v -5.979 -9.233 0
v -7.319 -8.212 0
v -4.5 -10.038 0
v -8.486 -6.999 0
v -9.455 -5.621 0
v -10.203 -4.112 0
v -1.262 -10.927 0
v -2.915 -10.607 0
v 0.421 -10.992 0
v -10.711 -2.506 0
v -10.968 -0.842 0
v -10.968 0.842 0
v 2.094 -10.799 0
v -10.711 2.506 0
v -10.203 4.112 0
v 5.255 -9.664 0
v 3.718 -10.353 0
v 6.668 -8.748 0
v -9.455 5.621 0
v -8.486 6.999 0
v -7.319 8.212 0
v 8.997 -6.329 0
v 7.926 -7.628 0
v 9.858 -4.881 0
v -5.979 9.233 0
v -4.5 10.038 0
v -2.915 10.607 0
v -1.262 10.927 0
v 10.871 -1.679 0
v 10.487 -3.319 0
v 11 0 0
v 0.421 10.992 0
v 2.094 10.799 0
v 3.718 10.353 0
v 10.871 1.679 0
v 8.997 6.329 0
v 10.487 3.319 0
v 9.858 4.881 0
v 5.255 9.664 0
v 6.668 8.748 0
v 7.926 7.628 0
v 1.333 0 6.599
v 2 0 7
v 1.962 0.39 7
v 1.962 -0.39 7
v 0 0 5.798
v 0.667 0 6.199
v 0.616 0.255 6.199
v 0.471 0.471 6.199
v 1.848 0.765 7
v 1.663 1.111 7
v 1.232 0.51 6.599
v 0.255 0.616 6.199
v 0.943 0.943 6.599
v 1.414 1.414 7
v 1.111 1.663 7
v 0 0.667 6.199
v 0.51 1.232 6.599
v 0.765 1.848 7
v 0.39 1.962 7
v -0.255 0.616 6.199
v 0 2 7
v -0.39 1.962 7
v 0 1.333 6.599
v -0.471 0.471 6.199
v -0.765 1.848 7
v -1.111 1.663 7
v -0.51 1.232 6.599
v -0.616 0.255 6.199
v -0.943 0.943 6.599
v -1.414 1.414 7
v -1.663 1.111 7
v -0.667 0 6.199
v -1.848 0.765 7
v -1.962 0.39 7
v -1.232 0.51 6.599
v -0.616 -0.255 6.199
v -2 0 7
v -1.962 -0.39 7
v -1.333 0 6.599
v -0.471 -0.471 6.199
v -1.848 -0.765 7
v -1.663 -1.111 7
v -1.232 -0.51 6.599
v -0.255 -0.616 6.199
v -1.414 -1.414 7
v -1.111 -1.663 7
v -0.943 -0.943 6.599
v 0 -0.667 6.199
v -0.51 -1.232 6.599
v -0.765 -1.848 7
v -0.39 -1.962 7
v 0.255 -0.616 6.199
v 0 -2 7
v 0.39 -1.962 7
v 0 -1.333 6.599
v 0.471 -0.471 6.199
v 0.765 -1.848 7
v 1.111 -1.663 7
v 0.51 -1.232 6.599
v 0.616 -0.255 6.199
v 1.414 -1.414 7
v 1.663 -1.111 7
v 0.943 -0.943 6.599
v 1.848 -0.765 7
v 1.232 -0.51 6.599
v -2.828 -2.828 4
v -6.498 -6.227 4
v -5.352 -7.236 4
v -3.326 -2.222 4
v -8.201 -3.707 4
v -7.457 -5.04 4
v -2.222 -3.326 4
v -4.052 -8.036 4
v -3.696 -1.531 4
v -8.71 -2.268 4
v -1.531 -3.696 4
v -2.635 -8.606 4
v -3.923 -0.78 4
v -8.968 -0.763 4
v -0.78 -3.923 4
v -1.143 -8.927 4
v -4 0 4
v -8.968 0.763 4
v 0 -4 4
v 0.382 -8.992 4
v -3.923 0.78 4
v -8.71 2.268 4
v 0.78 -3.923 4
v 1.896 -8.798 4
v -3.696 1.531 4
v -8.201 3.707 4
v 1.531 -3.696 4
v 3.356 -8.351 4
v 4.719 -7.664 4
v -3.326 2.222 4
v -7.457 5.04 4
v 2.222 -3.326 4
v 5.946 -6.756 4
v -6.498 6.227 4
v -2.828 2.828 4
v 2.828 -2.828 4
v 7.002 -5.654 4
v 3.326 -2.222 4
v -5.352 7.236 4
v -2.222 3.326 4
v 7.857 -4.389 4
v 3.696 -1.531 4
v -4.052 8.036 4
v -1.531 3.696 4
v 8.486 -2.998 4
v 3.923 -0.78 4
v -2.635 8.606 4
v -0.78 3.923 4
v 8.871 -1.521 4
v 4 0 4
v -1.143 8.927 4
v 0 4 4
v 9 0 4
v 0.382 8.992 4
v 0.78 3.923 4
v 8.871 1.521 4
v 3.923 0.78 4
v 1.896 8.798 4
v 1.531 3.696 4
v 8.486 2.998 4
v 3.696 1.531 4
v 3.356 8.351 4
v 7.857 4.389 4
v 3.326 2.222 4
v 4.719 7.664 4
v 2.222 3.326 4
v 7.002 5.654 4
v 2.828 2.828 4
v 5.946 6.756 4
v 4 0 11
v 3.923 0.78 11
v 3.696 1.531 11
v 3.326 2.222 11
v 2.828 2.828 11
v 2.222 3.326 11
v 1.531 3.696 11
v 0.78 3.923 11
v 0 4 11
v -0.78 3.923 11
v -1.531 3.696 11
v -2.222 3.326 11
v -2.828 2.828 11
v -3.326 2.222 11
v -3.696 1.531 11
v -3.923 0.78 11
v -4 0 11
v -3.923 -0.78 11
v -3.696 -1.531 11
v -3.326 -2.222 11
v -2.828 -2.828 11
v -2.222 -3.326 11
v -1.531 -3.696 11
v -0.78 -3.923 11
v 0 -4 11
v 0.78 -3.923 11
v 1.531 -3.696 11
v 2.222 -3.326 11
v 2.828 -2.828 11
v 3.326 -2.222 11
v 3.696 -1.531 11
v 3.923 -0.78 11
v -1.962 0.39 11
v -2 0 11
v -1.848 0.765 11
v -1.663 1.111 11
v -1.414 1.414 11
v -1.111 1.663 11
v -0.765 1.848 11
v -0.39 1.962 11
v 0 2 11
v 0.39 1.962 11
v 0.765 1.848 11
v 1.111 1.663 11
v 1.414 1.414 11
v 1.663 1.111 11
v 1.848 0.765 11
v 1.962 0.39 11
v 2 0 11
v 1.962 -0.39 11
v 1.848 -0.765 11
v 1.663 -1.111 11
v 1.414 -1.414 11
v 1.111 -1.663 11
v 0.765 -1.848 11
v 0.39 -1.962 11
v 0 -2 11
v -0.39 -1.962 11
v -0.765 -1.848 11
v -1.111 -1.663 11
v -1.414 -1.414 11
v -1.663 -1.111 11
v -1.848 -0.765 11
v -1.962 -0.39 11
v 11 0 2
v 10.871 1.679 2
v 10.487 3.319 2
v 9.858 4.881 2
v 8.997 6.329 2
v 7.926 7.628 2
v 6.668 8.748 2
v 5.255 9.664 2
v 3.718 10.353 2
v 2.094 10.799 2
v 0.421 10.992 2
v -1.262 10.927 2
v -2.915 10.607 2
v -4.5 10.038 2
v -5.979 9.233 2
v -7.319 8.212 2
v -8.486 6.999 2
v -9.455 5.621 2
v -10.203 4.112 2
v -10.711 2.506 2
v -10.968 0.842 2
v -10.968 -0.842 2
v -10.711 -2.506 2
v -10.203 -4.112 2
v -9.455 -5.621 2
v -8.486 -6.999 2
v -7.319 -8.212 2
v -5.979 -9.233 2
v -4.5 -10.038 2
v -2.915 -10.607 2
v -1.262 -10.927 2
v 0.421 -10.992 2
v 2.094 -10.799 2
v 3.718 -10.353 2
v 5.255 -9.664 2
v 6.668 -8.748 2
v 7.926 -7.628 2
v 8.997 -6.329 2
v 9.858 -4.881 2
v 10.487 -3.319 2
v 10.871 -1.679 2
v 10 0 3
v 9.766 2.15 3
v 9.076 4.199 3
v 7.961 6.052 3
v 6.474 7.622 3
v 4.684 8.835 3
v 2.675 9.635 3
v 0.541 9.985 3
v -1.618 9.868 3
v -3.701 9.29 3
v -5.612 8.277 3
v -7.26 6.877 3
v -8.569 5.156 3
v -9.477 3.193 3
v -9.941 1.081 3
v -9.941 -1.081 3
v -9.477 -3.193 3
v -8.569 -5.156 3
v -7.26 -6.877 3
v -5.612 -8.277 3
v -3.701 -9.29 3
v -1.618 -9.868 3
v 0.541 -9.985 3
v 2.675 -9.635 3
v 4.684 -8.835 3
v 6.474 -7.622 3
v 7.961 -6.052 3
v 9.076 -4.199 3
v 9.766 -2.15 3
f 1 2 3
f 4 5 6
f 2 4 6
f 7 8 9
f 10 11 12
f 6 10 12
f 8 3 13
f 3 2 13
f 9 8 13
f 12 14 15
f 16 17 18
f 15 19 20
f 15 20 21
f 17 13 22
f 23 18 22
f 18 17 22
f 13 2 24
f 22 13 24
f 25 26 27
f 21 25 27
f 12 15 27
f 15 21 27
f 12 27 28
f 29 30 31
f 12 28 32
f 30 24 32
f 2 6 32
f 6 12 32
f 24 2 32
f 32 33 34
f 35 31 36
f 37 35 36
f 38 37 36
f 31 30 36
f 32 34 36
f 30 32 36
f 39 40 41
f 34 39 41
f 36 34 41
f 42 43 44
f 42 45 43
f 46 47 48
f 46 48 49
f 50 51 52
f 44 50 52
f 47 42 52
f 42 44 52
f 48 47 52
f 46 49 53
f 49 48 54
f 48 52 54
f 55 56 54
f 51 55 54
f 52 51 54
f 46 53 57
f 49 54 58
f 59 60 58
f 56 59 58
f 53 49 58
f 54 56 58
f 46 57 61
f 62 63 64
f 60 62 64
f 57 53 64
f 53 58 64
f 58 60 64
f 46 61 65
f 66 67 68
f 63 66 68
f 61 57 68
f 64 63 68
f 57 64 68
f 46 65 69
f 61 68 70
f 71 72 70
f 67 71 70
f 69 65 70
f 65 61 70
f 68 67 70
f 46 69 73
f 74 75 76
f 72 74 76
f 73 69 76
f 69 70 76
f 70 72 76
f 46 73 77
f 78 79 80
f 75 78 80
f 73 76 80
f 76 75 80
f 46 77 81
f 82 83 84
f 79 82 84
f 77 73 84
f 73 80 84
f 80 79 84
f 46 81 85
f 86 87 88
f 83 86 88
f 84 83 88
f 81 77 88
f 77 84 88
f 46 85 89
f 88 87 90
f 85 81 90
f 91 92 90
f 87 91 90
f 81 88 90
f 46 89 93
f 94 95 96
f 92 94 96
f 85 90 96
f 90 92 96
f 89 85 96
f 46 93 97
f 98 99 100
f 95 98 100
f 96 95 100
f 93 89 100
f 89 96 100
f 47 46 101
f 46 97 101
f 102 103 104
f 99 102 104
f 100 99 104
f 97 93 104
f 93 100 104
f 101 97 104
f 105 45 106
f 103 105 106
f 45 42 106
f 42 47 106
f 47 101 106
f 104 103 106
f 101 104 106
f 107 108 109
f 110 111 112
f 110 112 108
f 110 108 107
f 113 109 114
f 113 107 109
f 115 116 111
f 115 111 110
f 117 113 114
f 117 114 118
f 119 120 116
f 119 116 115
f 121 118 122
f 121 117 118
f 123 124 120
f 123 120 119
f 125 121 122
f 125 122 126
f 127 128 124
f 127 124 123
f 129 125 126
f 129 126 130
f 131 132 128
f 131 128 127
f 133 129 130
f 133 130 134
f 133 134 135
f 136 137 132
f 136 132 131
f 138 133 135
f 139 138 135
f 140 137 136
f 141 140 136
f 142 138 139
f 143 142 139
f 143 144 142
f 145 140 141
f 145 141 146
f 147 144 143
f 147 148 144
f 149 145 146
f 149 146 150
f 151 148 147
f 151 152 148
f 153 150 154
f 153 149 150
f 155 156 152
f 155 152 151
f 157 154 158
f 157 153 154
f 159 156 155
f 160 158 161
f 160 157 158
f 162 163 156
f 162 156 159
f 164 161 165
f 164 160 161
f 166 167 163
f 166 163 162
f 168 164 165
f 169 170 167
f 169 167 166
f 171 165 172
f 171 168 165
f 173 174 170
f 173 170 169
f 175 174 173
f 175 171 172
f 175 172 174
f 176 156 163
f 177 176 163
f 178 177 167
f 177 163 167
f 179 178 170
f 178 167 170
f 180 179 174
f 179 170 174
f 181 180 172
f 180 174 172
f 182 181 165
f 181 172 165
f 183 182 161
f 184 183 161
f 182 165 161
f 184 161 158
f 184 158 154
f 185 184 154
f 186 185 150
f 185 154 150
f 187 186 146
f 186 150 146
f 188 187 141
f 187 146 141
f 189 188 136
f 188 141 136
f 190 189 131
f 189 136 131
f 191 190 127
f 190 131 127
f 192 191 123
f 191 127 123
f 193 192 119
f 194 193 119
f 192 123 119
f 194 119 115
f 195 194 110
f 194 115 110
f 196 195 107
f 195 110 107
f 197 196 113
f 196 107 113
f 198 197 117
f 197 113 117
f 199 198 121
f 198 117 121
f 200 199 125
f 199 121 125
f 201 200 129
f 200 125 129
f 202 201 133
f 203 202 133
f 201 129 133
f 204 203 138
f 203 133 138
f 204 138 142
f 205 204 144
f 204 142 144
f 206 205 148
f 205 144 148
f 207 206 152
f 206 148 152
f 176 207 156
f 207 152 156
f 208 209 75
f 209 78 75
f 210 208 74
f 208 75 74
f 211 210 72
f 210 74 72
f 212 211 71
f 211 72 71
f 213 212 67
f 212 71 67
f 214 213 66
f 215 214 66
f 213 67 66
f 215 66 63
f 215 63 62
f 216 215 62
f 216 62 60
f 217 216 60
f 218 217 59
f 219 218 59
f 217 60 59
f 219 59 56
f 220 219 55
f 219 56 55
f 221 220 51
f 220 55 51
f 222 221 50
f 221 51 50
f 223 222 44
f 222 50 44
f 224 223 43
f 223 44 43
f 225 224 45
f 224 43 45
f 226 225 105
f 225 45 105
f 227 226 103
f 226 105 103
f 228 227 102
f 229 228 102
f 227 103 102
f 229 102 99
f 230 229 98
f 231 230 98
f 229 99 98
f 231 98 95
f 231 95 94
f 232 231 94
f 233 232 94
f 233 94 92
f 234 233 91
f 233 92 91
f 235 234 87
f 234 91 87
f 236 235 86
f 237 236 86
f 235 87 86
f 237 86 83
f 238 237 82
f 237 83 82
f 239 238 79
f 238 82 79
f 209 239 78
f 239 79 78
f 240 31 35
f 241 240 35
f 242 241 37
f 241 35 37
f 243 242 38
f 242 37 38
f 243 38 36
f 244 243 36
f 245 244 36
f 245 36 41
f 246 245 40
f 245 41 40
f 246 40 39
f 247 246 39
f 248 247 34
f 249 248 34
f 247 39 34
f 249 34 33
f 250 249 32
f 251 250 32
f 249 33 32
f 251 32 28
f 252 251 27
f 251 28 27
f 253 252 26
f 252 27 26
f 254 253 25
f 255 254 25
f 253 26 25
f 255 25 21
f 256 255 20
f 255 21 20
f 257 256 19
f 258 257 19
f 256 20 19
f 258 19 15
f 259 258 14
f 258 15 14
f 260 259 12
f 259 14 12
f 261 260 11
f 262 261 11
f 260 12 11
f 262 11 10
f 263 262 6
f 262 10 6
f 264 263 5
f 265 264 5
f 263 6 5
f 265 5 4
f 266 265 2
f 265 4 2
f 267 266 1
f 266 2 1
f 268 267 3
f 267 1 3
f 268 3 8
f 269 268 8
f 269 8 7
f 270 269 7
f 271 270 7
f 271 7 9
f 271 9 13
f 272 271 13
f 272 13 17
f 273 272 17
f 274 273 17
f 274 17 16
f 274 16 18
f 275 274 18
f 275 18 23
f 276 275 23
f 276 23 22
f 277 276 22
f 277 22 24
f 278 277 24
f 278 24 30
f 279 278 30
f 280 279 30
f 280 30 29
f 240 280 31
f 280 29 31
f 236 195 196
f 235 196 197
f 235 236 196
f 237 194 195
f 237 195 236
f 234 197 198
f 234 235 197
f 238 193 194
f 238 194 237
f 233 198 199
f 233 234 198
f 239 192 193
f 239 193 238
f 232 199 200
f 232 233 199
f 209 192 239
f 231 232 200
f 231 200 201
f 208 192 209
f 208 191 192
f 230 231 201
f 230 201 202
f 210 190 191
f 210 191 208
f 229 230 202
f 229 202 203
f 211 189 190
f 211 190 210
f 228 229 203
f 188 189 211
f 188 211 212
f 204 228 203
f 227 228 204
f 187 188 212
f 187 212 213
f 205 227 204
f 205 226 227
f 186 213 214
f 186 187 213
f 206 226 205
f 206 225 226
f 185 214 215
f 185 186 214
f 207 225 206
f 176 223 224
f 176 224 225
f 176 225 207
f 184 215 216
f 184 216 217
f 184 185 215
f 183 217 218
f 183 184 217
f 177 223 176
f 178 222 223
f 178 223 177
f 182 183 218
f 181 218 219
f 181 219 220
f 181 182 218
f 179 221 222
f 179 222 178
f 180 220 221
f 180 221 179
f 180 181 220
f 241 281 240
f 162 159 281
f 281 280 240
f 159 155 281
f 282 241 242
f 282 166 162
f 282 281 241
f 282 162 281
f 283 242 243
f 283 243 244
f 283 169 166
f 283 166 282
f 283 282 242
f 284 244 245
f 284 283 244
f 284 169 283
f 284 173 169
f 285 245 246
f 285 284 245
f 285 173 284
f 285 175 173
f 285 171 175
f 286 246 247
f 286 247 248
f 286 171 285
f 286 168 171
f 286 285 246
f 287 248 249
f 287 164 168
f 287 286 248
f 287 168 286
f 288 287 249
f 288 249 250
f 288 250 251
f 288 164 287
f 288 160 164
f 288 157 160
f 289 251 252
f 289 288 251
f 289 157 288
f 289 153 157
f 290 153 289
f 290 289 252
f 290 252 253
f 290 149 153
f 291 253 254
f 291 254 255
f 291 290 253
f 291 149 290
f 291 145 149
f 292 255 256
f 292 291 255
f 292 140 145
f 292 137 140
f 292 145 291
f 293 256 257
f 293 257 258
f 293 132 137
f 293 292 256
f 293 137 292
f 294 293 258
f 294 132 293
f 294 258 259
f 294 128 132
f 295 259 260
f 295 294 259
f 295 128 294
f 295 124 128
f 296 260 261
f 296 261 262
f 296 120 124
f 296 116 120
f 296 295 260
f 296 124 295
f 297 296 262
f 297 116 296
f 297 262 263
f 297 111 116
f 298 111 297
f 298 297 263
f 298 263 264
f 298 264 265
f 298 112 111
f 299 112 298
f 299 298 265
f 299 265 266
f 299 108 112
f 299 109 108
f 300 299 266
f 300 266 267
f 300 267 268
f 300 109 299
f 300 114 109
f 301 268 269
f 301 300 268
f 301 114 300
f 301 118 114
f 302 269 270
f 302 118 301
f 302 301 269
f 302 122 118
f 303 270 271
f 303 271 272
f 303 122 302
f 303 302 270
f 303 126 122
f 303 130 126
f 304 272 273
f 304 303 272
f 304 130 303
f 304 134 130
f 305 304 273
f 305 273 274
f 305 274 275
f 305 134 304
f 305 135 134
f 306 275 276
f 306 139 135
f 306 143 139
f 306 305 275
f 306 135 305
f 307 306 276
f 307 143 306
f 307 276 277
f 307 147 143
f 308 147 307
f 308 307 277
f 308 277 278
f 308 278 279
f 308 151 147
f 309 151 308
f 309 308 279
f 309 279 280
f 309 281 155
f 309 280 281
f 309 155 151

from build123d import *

# Parameters (mm, degrees)
F0_R     = 11
F1_DEPTH = 4
F2_SIZE  = 2
F3_R     = 4
F4_DEPTH = 7
F6_D     = 4
F6_DEPTH = 4
F6_TIP   = 1.2017212381


with BuildPart() as f1:
    # F0 (on Top) → F1 (new body)
    with BuildSketch(Plane.XY):
        Circle(F0_R)
    extrude(amount=F1_DEPTH)

    # F2
    f2_edges = [f1.edges().sort_by_distance(p)[0] for p in [
        (-11, 0, 4),
    ]]
    chamfer(f2_edges, length=F2_SIZE)

    # F3 (on face) → F4 (join)
    with BuildSketch(Plane.XY.offset(4)):
        Circle(F3_R)
    extrude(amount=F4_DEPTH)

    # F6
    with Locations(Plane.XY.offset(11)):
        with Locations((0, 0)):
            Hole(F6_D / 2, depth=F6_DEPTH)
            with Locations((0, 0, -(F6_DEPTH + F6_TIP / 2))):  # 118° drill point
                Cone(0, F6_D / 2, F6_TIP, mode=Mode.SUBTRACT)


solid = f1.part
